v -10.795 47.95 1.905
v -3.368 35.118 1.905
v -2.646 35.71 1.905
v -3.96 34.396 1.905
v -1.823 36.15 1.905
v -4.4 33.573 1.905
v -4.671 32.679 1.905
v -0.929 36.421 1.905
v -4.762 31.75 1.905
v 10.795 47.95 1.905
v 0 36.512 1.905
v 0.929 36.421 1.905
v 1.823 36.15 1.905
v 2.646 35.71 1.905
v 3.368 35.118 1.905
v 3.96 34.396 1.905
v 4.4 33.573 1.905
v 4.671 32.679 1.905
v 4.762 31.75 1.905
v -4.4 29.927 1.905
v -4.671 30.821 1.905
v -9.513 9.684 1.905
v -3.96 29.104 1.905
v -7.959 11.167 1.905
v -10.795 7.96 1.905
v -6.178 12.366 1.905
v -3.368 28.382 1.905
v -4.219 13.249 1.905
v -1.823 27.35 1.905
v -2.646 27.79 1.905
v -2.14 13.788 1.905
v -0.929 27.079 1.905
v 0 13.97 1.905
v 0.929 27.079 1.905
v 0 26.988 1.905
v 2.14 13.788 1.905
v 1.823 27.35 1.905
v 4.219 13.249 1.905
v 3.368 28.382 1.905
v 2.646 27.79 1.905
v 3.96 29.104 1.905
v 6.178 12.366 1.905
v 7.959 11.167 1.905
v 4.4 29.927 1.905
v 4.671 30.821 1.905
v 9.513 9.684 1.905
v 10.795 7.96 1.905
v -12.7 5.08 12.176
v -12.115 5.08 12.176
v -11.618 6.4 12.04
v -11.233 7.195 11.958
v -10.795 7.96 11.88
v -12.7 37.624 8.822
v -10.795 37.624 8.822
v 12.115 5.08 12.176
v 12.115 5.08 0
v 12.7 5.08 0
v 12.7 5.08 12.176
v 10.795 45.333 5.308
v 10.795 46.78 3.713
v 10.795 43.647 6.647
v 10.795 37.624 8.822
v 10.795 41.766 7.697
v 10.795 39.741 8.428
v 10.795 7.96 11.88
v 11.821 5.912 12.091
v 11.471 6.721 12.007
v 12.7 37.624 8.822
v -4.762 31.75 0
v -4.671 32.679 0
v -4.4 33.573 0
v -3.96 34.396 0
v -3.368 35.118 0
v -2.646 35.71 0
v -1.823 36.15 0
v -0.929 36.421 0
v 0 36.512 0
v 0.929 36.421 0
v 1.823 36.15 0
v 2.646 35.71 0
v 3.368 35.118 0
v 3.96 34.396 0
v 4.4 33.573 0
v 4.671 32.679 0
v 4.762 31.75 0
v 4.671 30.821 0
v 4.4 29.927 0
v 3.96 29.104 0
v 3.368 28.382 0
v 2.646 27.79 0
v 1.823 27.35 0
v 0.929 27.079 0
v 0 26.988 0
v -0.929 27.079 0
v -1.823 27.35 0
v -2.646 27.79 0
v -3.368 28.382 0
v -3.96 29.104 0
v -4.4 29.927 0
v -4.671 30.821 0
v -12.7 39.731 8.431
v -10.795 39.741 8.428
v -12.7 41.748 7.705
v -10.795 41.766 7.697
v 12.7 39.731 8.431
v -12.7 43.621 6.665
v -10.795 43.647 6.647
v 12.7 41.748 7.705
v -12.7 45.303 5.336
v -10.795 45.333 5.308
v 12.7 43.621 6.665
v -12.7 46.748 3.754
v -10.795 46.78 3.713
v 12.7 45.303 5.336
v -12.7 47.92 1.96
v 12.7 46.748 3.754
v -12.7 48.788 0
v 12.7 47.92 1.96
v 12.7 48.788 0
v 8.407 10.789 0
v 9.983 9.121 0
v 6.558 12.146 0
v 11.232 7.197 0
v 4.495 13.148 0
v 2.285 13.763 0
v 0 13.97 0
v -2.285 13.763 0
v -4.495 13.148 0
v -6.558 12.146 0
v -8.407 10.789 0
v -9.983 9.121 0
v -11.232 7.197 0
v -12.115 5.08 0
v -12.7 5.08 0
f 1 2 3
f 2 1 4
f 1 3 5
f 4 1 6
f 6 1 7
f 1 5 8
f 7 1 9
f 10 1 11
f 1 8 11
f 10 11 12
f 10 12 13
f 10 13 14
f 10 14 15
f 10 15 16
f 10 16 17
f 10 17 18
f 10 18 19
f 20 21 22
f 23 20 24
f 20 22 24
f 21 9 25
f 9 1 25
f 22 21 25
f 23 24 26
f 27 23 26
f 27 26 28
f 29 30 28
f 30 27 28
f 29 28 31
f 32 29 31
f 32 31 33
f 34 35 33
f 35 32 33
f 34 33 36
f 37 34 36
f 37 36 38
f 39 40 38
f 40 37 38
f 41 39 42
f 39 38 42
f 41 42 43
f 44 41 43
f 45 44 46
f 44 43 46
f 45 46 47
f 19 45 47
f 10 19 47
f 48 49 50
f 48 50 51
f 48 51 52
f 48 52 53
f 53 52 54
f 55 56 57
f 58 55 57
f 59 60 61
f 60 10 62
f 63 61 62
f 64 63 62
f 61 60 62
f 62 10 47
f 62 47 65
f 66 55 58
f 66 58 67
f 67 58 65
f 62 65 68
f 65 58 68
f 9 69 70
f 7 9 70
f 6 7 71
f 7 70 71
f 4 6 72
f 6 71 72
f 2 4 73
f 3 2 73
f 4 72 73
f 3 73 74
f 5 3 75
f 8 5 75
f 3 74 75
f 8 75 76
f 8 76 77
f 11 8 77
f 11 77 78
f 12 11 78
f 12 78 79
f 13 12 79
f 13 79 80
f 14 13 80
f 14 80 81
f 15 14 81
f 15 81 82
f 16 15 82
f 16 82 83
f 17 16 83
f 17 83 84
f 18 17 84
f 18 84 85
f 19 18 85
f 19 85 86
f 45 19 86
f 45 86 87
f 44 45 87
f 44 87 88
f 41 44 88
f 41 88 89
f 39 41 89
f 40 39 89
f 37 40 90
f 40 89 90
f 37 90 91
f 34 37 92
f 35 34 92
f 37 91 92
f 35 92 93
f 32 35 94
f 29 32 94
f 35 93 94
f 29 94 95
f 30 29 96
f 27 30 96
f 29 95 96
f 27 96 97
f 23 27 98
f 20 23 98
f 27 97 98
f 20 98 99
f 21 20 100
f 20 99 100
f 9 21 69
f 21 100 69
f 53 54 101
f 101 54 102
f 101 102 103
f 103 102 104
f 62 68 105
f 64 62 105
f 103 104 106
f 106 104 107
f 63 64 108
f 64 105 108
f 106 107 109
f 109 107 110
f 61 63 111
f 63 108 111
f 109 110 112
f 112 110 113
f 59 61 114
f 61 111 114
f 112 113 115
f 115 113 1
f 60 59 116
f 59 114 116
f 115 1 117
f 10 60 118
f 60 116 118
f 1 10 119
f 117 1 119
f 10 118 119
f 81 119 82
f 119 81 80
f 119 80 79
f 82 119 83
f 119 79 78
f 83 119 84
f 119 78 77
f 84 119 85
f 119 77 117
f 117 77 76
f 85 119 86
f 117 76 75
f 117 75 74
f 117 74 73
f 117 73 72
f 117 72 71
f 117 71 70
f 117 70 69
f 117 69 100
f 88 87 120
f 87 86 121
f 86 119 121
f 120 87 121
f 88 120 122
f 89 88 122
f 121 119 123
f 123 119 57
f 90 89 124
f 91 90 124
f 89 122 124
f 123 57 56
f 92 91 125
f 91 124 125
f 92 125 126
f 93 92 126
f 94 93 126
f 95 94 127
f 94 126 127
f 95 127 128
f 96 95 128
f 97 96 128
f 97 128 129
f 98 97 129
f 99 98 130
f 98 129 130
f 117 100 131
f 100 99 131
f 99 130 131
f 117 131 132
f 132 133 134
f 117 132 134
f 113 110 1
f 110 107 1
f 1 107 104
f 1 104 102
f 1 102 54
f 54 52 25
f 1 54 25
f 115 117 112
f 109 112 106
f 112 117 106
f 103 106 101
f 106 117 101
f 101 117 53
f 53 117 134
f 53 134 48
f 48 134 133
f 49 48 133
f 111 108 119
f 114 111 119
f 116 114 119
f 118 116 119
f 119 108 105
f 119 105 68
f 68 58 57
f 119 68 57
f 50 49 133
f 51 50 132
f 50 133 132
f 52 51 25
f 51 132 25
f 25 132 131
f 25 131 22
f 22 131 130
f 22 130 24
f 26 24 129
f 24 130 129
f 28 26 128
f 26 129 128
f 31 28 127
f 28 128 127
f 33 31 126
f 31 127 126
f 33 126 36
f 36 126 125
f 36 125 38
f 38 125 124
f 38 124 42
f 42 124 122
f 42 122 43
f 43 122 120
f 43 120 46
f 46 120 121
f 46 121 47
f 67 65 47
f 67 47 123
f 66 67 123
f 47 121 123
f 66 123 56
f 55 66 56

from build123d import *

# Parameters (mm, degrees)
BOSS_EXTRUDE1_DEPTH = 49.53
CUT_EXTRUDE1_DEPTH  = 44.45
SKETCH3_R           = 4.7625
CUT_EXTRUDE2_DEPTH  = 44.45


with BuildPart() as part:
    # Sketch1 → Boss-Extrude1 (new body)
    with BuildSketch(Plane(origin=(0, 0, 0), x_dir=(1, 0, 0), z_dir=(0, 1, 0))):
        Polygon((-12.7, -12.7), (-10.795, -12.7), (-10.795, -1.905), (10.795, -1.905), (10.795, -12.7), (12.7, -12.7), (12.7, 0), (-12.7, 0), align=None)
    extrude(amount=BOSS_EXTRUDE1_DEPTH)

    # Sketch2 → Cut-Extrude1 (cut)
    with BuildSketch(Plane(origin=(12.7, 0, 0), x_dir=(0, 0, -1), z_dir=(1, 0, 0))):
        with BuildLine():
            Line((-12.7, 0), (-8.821918242, 37.623946857))
            ThreePointArc((-8.821918242, 37.623946857), (-4.512325964, 46.11357553), (4.374429599, 49.53))
            Line((4.374429599, 49.53), (-12.7, 49.53))
            Line((-12.7, 49.53), (-12.7, 0))
        make_face()
    extrude(amount=-CUT_EXTRUDE1_DEPTH, mode=Mode.SUBTRACT)

    # Sketch3 → Cut-Extrude2 (cut)
    with BuildSketch(Plane(origin=(0, 0, 0), x_dir=(-1, 0, 0), z_dir=(0, 0, -1))):
        with Locations((0, 31.75)):
            Circle(SKETCH3_R)
        with BuildLine():
            Line((-12.115027858, 5.08), (-12.7, 5.08))
            Line((-12.7, 5.08), (-12.7, 0))
            Line((-12.7, 0), (12.7, 0))
            Line((12.7, 0), (12.7, 5.08))
            Line((12.7, 5.08), (12.115027858, 5.08))
            ThreePointArc((12.115027858, 5.08), (0, 13.97), (-12.115027858, 5.08))
        make_face()
    extrude(amount=-CUT_EXTRUDE2_DEPTH, mode=Mode.SUBTRACT)


solid = part.part
